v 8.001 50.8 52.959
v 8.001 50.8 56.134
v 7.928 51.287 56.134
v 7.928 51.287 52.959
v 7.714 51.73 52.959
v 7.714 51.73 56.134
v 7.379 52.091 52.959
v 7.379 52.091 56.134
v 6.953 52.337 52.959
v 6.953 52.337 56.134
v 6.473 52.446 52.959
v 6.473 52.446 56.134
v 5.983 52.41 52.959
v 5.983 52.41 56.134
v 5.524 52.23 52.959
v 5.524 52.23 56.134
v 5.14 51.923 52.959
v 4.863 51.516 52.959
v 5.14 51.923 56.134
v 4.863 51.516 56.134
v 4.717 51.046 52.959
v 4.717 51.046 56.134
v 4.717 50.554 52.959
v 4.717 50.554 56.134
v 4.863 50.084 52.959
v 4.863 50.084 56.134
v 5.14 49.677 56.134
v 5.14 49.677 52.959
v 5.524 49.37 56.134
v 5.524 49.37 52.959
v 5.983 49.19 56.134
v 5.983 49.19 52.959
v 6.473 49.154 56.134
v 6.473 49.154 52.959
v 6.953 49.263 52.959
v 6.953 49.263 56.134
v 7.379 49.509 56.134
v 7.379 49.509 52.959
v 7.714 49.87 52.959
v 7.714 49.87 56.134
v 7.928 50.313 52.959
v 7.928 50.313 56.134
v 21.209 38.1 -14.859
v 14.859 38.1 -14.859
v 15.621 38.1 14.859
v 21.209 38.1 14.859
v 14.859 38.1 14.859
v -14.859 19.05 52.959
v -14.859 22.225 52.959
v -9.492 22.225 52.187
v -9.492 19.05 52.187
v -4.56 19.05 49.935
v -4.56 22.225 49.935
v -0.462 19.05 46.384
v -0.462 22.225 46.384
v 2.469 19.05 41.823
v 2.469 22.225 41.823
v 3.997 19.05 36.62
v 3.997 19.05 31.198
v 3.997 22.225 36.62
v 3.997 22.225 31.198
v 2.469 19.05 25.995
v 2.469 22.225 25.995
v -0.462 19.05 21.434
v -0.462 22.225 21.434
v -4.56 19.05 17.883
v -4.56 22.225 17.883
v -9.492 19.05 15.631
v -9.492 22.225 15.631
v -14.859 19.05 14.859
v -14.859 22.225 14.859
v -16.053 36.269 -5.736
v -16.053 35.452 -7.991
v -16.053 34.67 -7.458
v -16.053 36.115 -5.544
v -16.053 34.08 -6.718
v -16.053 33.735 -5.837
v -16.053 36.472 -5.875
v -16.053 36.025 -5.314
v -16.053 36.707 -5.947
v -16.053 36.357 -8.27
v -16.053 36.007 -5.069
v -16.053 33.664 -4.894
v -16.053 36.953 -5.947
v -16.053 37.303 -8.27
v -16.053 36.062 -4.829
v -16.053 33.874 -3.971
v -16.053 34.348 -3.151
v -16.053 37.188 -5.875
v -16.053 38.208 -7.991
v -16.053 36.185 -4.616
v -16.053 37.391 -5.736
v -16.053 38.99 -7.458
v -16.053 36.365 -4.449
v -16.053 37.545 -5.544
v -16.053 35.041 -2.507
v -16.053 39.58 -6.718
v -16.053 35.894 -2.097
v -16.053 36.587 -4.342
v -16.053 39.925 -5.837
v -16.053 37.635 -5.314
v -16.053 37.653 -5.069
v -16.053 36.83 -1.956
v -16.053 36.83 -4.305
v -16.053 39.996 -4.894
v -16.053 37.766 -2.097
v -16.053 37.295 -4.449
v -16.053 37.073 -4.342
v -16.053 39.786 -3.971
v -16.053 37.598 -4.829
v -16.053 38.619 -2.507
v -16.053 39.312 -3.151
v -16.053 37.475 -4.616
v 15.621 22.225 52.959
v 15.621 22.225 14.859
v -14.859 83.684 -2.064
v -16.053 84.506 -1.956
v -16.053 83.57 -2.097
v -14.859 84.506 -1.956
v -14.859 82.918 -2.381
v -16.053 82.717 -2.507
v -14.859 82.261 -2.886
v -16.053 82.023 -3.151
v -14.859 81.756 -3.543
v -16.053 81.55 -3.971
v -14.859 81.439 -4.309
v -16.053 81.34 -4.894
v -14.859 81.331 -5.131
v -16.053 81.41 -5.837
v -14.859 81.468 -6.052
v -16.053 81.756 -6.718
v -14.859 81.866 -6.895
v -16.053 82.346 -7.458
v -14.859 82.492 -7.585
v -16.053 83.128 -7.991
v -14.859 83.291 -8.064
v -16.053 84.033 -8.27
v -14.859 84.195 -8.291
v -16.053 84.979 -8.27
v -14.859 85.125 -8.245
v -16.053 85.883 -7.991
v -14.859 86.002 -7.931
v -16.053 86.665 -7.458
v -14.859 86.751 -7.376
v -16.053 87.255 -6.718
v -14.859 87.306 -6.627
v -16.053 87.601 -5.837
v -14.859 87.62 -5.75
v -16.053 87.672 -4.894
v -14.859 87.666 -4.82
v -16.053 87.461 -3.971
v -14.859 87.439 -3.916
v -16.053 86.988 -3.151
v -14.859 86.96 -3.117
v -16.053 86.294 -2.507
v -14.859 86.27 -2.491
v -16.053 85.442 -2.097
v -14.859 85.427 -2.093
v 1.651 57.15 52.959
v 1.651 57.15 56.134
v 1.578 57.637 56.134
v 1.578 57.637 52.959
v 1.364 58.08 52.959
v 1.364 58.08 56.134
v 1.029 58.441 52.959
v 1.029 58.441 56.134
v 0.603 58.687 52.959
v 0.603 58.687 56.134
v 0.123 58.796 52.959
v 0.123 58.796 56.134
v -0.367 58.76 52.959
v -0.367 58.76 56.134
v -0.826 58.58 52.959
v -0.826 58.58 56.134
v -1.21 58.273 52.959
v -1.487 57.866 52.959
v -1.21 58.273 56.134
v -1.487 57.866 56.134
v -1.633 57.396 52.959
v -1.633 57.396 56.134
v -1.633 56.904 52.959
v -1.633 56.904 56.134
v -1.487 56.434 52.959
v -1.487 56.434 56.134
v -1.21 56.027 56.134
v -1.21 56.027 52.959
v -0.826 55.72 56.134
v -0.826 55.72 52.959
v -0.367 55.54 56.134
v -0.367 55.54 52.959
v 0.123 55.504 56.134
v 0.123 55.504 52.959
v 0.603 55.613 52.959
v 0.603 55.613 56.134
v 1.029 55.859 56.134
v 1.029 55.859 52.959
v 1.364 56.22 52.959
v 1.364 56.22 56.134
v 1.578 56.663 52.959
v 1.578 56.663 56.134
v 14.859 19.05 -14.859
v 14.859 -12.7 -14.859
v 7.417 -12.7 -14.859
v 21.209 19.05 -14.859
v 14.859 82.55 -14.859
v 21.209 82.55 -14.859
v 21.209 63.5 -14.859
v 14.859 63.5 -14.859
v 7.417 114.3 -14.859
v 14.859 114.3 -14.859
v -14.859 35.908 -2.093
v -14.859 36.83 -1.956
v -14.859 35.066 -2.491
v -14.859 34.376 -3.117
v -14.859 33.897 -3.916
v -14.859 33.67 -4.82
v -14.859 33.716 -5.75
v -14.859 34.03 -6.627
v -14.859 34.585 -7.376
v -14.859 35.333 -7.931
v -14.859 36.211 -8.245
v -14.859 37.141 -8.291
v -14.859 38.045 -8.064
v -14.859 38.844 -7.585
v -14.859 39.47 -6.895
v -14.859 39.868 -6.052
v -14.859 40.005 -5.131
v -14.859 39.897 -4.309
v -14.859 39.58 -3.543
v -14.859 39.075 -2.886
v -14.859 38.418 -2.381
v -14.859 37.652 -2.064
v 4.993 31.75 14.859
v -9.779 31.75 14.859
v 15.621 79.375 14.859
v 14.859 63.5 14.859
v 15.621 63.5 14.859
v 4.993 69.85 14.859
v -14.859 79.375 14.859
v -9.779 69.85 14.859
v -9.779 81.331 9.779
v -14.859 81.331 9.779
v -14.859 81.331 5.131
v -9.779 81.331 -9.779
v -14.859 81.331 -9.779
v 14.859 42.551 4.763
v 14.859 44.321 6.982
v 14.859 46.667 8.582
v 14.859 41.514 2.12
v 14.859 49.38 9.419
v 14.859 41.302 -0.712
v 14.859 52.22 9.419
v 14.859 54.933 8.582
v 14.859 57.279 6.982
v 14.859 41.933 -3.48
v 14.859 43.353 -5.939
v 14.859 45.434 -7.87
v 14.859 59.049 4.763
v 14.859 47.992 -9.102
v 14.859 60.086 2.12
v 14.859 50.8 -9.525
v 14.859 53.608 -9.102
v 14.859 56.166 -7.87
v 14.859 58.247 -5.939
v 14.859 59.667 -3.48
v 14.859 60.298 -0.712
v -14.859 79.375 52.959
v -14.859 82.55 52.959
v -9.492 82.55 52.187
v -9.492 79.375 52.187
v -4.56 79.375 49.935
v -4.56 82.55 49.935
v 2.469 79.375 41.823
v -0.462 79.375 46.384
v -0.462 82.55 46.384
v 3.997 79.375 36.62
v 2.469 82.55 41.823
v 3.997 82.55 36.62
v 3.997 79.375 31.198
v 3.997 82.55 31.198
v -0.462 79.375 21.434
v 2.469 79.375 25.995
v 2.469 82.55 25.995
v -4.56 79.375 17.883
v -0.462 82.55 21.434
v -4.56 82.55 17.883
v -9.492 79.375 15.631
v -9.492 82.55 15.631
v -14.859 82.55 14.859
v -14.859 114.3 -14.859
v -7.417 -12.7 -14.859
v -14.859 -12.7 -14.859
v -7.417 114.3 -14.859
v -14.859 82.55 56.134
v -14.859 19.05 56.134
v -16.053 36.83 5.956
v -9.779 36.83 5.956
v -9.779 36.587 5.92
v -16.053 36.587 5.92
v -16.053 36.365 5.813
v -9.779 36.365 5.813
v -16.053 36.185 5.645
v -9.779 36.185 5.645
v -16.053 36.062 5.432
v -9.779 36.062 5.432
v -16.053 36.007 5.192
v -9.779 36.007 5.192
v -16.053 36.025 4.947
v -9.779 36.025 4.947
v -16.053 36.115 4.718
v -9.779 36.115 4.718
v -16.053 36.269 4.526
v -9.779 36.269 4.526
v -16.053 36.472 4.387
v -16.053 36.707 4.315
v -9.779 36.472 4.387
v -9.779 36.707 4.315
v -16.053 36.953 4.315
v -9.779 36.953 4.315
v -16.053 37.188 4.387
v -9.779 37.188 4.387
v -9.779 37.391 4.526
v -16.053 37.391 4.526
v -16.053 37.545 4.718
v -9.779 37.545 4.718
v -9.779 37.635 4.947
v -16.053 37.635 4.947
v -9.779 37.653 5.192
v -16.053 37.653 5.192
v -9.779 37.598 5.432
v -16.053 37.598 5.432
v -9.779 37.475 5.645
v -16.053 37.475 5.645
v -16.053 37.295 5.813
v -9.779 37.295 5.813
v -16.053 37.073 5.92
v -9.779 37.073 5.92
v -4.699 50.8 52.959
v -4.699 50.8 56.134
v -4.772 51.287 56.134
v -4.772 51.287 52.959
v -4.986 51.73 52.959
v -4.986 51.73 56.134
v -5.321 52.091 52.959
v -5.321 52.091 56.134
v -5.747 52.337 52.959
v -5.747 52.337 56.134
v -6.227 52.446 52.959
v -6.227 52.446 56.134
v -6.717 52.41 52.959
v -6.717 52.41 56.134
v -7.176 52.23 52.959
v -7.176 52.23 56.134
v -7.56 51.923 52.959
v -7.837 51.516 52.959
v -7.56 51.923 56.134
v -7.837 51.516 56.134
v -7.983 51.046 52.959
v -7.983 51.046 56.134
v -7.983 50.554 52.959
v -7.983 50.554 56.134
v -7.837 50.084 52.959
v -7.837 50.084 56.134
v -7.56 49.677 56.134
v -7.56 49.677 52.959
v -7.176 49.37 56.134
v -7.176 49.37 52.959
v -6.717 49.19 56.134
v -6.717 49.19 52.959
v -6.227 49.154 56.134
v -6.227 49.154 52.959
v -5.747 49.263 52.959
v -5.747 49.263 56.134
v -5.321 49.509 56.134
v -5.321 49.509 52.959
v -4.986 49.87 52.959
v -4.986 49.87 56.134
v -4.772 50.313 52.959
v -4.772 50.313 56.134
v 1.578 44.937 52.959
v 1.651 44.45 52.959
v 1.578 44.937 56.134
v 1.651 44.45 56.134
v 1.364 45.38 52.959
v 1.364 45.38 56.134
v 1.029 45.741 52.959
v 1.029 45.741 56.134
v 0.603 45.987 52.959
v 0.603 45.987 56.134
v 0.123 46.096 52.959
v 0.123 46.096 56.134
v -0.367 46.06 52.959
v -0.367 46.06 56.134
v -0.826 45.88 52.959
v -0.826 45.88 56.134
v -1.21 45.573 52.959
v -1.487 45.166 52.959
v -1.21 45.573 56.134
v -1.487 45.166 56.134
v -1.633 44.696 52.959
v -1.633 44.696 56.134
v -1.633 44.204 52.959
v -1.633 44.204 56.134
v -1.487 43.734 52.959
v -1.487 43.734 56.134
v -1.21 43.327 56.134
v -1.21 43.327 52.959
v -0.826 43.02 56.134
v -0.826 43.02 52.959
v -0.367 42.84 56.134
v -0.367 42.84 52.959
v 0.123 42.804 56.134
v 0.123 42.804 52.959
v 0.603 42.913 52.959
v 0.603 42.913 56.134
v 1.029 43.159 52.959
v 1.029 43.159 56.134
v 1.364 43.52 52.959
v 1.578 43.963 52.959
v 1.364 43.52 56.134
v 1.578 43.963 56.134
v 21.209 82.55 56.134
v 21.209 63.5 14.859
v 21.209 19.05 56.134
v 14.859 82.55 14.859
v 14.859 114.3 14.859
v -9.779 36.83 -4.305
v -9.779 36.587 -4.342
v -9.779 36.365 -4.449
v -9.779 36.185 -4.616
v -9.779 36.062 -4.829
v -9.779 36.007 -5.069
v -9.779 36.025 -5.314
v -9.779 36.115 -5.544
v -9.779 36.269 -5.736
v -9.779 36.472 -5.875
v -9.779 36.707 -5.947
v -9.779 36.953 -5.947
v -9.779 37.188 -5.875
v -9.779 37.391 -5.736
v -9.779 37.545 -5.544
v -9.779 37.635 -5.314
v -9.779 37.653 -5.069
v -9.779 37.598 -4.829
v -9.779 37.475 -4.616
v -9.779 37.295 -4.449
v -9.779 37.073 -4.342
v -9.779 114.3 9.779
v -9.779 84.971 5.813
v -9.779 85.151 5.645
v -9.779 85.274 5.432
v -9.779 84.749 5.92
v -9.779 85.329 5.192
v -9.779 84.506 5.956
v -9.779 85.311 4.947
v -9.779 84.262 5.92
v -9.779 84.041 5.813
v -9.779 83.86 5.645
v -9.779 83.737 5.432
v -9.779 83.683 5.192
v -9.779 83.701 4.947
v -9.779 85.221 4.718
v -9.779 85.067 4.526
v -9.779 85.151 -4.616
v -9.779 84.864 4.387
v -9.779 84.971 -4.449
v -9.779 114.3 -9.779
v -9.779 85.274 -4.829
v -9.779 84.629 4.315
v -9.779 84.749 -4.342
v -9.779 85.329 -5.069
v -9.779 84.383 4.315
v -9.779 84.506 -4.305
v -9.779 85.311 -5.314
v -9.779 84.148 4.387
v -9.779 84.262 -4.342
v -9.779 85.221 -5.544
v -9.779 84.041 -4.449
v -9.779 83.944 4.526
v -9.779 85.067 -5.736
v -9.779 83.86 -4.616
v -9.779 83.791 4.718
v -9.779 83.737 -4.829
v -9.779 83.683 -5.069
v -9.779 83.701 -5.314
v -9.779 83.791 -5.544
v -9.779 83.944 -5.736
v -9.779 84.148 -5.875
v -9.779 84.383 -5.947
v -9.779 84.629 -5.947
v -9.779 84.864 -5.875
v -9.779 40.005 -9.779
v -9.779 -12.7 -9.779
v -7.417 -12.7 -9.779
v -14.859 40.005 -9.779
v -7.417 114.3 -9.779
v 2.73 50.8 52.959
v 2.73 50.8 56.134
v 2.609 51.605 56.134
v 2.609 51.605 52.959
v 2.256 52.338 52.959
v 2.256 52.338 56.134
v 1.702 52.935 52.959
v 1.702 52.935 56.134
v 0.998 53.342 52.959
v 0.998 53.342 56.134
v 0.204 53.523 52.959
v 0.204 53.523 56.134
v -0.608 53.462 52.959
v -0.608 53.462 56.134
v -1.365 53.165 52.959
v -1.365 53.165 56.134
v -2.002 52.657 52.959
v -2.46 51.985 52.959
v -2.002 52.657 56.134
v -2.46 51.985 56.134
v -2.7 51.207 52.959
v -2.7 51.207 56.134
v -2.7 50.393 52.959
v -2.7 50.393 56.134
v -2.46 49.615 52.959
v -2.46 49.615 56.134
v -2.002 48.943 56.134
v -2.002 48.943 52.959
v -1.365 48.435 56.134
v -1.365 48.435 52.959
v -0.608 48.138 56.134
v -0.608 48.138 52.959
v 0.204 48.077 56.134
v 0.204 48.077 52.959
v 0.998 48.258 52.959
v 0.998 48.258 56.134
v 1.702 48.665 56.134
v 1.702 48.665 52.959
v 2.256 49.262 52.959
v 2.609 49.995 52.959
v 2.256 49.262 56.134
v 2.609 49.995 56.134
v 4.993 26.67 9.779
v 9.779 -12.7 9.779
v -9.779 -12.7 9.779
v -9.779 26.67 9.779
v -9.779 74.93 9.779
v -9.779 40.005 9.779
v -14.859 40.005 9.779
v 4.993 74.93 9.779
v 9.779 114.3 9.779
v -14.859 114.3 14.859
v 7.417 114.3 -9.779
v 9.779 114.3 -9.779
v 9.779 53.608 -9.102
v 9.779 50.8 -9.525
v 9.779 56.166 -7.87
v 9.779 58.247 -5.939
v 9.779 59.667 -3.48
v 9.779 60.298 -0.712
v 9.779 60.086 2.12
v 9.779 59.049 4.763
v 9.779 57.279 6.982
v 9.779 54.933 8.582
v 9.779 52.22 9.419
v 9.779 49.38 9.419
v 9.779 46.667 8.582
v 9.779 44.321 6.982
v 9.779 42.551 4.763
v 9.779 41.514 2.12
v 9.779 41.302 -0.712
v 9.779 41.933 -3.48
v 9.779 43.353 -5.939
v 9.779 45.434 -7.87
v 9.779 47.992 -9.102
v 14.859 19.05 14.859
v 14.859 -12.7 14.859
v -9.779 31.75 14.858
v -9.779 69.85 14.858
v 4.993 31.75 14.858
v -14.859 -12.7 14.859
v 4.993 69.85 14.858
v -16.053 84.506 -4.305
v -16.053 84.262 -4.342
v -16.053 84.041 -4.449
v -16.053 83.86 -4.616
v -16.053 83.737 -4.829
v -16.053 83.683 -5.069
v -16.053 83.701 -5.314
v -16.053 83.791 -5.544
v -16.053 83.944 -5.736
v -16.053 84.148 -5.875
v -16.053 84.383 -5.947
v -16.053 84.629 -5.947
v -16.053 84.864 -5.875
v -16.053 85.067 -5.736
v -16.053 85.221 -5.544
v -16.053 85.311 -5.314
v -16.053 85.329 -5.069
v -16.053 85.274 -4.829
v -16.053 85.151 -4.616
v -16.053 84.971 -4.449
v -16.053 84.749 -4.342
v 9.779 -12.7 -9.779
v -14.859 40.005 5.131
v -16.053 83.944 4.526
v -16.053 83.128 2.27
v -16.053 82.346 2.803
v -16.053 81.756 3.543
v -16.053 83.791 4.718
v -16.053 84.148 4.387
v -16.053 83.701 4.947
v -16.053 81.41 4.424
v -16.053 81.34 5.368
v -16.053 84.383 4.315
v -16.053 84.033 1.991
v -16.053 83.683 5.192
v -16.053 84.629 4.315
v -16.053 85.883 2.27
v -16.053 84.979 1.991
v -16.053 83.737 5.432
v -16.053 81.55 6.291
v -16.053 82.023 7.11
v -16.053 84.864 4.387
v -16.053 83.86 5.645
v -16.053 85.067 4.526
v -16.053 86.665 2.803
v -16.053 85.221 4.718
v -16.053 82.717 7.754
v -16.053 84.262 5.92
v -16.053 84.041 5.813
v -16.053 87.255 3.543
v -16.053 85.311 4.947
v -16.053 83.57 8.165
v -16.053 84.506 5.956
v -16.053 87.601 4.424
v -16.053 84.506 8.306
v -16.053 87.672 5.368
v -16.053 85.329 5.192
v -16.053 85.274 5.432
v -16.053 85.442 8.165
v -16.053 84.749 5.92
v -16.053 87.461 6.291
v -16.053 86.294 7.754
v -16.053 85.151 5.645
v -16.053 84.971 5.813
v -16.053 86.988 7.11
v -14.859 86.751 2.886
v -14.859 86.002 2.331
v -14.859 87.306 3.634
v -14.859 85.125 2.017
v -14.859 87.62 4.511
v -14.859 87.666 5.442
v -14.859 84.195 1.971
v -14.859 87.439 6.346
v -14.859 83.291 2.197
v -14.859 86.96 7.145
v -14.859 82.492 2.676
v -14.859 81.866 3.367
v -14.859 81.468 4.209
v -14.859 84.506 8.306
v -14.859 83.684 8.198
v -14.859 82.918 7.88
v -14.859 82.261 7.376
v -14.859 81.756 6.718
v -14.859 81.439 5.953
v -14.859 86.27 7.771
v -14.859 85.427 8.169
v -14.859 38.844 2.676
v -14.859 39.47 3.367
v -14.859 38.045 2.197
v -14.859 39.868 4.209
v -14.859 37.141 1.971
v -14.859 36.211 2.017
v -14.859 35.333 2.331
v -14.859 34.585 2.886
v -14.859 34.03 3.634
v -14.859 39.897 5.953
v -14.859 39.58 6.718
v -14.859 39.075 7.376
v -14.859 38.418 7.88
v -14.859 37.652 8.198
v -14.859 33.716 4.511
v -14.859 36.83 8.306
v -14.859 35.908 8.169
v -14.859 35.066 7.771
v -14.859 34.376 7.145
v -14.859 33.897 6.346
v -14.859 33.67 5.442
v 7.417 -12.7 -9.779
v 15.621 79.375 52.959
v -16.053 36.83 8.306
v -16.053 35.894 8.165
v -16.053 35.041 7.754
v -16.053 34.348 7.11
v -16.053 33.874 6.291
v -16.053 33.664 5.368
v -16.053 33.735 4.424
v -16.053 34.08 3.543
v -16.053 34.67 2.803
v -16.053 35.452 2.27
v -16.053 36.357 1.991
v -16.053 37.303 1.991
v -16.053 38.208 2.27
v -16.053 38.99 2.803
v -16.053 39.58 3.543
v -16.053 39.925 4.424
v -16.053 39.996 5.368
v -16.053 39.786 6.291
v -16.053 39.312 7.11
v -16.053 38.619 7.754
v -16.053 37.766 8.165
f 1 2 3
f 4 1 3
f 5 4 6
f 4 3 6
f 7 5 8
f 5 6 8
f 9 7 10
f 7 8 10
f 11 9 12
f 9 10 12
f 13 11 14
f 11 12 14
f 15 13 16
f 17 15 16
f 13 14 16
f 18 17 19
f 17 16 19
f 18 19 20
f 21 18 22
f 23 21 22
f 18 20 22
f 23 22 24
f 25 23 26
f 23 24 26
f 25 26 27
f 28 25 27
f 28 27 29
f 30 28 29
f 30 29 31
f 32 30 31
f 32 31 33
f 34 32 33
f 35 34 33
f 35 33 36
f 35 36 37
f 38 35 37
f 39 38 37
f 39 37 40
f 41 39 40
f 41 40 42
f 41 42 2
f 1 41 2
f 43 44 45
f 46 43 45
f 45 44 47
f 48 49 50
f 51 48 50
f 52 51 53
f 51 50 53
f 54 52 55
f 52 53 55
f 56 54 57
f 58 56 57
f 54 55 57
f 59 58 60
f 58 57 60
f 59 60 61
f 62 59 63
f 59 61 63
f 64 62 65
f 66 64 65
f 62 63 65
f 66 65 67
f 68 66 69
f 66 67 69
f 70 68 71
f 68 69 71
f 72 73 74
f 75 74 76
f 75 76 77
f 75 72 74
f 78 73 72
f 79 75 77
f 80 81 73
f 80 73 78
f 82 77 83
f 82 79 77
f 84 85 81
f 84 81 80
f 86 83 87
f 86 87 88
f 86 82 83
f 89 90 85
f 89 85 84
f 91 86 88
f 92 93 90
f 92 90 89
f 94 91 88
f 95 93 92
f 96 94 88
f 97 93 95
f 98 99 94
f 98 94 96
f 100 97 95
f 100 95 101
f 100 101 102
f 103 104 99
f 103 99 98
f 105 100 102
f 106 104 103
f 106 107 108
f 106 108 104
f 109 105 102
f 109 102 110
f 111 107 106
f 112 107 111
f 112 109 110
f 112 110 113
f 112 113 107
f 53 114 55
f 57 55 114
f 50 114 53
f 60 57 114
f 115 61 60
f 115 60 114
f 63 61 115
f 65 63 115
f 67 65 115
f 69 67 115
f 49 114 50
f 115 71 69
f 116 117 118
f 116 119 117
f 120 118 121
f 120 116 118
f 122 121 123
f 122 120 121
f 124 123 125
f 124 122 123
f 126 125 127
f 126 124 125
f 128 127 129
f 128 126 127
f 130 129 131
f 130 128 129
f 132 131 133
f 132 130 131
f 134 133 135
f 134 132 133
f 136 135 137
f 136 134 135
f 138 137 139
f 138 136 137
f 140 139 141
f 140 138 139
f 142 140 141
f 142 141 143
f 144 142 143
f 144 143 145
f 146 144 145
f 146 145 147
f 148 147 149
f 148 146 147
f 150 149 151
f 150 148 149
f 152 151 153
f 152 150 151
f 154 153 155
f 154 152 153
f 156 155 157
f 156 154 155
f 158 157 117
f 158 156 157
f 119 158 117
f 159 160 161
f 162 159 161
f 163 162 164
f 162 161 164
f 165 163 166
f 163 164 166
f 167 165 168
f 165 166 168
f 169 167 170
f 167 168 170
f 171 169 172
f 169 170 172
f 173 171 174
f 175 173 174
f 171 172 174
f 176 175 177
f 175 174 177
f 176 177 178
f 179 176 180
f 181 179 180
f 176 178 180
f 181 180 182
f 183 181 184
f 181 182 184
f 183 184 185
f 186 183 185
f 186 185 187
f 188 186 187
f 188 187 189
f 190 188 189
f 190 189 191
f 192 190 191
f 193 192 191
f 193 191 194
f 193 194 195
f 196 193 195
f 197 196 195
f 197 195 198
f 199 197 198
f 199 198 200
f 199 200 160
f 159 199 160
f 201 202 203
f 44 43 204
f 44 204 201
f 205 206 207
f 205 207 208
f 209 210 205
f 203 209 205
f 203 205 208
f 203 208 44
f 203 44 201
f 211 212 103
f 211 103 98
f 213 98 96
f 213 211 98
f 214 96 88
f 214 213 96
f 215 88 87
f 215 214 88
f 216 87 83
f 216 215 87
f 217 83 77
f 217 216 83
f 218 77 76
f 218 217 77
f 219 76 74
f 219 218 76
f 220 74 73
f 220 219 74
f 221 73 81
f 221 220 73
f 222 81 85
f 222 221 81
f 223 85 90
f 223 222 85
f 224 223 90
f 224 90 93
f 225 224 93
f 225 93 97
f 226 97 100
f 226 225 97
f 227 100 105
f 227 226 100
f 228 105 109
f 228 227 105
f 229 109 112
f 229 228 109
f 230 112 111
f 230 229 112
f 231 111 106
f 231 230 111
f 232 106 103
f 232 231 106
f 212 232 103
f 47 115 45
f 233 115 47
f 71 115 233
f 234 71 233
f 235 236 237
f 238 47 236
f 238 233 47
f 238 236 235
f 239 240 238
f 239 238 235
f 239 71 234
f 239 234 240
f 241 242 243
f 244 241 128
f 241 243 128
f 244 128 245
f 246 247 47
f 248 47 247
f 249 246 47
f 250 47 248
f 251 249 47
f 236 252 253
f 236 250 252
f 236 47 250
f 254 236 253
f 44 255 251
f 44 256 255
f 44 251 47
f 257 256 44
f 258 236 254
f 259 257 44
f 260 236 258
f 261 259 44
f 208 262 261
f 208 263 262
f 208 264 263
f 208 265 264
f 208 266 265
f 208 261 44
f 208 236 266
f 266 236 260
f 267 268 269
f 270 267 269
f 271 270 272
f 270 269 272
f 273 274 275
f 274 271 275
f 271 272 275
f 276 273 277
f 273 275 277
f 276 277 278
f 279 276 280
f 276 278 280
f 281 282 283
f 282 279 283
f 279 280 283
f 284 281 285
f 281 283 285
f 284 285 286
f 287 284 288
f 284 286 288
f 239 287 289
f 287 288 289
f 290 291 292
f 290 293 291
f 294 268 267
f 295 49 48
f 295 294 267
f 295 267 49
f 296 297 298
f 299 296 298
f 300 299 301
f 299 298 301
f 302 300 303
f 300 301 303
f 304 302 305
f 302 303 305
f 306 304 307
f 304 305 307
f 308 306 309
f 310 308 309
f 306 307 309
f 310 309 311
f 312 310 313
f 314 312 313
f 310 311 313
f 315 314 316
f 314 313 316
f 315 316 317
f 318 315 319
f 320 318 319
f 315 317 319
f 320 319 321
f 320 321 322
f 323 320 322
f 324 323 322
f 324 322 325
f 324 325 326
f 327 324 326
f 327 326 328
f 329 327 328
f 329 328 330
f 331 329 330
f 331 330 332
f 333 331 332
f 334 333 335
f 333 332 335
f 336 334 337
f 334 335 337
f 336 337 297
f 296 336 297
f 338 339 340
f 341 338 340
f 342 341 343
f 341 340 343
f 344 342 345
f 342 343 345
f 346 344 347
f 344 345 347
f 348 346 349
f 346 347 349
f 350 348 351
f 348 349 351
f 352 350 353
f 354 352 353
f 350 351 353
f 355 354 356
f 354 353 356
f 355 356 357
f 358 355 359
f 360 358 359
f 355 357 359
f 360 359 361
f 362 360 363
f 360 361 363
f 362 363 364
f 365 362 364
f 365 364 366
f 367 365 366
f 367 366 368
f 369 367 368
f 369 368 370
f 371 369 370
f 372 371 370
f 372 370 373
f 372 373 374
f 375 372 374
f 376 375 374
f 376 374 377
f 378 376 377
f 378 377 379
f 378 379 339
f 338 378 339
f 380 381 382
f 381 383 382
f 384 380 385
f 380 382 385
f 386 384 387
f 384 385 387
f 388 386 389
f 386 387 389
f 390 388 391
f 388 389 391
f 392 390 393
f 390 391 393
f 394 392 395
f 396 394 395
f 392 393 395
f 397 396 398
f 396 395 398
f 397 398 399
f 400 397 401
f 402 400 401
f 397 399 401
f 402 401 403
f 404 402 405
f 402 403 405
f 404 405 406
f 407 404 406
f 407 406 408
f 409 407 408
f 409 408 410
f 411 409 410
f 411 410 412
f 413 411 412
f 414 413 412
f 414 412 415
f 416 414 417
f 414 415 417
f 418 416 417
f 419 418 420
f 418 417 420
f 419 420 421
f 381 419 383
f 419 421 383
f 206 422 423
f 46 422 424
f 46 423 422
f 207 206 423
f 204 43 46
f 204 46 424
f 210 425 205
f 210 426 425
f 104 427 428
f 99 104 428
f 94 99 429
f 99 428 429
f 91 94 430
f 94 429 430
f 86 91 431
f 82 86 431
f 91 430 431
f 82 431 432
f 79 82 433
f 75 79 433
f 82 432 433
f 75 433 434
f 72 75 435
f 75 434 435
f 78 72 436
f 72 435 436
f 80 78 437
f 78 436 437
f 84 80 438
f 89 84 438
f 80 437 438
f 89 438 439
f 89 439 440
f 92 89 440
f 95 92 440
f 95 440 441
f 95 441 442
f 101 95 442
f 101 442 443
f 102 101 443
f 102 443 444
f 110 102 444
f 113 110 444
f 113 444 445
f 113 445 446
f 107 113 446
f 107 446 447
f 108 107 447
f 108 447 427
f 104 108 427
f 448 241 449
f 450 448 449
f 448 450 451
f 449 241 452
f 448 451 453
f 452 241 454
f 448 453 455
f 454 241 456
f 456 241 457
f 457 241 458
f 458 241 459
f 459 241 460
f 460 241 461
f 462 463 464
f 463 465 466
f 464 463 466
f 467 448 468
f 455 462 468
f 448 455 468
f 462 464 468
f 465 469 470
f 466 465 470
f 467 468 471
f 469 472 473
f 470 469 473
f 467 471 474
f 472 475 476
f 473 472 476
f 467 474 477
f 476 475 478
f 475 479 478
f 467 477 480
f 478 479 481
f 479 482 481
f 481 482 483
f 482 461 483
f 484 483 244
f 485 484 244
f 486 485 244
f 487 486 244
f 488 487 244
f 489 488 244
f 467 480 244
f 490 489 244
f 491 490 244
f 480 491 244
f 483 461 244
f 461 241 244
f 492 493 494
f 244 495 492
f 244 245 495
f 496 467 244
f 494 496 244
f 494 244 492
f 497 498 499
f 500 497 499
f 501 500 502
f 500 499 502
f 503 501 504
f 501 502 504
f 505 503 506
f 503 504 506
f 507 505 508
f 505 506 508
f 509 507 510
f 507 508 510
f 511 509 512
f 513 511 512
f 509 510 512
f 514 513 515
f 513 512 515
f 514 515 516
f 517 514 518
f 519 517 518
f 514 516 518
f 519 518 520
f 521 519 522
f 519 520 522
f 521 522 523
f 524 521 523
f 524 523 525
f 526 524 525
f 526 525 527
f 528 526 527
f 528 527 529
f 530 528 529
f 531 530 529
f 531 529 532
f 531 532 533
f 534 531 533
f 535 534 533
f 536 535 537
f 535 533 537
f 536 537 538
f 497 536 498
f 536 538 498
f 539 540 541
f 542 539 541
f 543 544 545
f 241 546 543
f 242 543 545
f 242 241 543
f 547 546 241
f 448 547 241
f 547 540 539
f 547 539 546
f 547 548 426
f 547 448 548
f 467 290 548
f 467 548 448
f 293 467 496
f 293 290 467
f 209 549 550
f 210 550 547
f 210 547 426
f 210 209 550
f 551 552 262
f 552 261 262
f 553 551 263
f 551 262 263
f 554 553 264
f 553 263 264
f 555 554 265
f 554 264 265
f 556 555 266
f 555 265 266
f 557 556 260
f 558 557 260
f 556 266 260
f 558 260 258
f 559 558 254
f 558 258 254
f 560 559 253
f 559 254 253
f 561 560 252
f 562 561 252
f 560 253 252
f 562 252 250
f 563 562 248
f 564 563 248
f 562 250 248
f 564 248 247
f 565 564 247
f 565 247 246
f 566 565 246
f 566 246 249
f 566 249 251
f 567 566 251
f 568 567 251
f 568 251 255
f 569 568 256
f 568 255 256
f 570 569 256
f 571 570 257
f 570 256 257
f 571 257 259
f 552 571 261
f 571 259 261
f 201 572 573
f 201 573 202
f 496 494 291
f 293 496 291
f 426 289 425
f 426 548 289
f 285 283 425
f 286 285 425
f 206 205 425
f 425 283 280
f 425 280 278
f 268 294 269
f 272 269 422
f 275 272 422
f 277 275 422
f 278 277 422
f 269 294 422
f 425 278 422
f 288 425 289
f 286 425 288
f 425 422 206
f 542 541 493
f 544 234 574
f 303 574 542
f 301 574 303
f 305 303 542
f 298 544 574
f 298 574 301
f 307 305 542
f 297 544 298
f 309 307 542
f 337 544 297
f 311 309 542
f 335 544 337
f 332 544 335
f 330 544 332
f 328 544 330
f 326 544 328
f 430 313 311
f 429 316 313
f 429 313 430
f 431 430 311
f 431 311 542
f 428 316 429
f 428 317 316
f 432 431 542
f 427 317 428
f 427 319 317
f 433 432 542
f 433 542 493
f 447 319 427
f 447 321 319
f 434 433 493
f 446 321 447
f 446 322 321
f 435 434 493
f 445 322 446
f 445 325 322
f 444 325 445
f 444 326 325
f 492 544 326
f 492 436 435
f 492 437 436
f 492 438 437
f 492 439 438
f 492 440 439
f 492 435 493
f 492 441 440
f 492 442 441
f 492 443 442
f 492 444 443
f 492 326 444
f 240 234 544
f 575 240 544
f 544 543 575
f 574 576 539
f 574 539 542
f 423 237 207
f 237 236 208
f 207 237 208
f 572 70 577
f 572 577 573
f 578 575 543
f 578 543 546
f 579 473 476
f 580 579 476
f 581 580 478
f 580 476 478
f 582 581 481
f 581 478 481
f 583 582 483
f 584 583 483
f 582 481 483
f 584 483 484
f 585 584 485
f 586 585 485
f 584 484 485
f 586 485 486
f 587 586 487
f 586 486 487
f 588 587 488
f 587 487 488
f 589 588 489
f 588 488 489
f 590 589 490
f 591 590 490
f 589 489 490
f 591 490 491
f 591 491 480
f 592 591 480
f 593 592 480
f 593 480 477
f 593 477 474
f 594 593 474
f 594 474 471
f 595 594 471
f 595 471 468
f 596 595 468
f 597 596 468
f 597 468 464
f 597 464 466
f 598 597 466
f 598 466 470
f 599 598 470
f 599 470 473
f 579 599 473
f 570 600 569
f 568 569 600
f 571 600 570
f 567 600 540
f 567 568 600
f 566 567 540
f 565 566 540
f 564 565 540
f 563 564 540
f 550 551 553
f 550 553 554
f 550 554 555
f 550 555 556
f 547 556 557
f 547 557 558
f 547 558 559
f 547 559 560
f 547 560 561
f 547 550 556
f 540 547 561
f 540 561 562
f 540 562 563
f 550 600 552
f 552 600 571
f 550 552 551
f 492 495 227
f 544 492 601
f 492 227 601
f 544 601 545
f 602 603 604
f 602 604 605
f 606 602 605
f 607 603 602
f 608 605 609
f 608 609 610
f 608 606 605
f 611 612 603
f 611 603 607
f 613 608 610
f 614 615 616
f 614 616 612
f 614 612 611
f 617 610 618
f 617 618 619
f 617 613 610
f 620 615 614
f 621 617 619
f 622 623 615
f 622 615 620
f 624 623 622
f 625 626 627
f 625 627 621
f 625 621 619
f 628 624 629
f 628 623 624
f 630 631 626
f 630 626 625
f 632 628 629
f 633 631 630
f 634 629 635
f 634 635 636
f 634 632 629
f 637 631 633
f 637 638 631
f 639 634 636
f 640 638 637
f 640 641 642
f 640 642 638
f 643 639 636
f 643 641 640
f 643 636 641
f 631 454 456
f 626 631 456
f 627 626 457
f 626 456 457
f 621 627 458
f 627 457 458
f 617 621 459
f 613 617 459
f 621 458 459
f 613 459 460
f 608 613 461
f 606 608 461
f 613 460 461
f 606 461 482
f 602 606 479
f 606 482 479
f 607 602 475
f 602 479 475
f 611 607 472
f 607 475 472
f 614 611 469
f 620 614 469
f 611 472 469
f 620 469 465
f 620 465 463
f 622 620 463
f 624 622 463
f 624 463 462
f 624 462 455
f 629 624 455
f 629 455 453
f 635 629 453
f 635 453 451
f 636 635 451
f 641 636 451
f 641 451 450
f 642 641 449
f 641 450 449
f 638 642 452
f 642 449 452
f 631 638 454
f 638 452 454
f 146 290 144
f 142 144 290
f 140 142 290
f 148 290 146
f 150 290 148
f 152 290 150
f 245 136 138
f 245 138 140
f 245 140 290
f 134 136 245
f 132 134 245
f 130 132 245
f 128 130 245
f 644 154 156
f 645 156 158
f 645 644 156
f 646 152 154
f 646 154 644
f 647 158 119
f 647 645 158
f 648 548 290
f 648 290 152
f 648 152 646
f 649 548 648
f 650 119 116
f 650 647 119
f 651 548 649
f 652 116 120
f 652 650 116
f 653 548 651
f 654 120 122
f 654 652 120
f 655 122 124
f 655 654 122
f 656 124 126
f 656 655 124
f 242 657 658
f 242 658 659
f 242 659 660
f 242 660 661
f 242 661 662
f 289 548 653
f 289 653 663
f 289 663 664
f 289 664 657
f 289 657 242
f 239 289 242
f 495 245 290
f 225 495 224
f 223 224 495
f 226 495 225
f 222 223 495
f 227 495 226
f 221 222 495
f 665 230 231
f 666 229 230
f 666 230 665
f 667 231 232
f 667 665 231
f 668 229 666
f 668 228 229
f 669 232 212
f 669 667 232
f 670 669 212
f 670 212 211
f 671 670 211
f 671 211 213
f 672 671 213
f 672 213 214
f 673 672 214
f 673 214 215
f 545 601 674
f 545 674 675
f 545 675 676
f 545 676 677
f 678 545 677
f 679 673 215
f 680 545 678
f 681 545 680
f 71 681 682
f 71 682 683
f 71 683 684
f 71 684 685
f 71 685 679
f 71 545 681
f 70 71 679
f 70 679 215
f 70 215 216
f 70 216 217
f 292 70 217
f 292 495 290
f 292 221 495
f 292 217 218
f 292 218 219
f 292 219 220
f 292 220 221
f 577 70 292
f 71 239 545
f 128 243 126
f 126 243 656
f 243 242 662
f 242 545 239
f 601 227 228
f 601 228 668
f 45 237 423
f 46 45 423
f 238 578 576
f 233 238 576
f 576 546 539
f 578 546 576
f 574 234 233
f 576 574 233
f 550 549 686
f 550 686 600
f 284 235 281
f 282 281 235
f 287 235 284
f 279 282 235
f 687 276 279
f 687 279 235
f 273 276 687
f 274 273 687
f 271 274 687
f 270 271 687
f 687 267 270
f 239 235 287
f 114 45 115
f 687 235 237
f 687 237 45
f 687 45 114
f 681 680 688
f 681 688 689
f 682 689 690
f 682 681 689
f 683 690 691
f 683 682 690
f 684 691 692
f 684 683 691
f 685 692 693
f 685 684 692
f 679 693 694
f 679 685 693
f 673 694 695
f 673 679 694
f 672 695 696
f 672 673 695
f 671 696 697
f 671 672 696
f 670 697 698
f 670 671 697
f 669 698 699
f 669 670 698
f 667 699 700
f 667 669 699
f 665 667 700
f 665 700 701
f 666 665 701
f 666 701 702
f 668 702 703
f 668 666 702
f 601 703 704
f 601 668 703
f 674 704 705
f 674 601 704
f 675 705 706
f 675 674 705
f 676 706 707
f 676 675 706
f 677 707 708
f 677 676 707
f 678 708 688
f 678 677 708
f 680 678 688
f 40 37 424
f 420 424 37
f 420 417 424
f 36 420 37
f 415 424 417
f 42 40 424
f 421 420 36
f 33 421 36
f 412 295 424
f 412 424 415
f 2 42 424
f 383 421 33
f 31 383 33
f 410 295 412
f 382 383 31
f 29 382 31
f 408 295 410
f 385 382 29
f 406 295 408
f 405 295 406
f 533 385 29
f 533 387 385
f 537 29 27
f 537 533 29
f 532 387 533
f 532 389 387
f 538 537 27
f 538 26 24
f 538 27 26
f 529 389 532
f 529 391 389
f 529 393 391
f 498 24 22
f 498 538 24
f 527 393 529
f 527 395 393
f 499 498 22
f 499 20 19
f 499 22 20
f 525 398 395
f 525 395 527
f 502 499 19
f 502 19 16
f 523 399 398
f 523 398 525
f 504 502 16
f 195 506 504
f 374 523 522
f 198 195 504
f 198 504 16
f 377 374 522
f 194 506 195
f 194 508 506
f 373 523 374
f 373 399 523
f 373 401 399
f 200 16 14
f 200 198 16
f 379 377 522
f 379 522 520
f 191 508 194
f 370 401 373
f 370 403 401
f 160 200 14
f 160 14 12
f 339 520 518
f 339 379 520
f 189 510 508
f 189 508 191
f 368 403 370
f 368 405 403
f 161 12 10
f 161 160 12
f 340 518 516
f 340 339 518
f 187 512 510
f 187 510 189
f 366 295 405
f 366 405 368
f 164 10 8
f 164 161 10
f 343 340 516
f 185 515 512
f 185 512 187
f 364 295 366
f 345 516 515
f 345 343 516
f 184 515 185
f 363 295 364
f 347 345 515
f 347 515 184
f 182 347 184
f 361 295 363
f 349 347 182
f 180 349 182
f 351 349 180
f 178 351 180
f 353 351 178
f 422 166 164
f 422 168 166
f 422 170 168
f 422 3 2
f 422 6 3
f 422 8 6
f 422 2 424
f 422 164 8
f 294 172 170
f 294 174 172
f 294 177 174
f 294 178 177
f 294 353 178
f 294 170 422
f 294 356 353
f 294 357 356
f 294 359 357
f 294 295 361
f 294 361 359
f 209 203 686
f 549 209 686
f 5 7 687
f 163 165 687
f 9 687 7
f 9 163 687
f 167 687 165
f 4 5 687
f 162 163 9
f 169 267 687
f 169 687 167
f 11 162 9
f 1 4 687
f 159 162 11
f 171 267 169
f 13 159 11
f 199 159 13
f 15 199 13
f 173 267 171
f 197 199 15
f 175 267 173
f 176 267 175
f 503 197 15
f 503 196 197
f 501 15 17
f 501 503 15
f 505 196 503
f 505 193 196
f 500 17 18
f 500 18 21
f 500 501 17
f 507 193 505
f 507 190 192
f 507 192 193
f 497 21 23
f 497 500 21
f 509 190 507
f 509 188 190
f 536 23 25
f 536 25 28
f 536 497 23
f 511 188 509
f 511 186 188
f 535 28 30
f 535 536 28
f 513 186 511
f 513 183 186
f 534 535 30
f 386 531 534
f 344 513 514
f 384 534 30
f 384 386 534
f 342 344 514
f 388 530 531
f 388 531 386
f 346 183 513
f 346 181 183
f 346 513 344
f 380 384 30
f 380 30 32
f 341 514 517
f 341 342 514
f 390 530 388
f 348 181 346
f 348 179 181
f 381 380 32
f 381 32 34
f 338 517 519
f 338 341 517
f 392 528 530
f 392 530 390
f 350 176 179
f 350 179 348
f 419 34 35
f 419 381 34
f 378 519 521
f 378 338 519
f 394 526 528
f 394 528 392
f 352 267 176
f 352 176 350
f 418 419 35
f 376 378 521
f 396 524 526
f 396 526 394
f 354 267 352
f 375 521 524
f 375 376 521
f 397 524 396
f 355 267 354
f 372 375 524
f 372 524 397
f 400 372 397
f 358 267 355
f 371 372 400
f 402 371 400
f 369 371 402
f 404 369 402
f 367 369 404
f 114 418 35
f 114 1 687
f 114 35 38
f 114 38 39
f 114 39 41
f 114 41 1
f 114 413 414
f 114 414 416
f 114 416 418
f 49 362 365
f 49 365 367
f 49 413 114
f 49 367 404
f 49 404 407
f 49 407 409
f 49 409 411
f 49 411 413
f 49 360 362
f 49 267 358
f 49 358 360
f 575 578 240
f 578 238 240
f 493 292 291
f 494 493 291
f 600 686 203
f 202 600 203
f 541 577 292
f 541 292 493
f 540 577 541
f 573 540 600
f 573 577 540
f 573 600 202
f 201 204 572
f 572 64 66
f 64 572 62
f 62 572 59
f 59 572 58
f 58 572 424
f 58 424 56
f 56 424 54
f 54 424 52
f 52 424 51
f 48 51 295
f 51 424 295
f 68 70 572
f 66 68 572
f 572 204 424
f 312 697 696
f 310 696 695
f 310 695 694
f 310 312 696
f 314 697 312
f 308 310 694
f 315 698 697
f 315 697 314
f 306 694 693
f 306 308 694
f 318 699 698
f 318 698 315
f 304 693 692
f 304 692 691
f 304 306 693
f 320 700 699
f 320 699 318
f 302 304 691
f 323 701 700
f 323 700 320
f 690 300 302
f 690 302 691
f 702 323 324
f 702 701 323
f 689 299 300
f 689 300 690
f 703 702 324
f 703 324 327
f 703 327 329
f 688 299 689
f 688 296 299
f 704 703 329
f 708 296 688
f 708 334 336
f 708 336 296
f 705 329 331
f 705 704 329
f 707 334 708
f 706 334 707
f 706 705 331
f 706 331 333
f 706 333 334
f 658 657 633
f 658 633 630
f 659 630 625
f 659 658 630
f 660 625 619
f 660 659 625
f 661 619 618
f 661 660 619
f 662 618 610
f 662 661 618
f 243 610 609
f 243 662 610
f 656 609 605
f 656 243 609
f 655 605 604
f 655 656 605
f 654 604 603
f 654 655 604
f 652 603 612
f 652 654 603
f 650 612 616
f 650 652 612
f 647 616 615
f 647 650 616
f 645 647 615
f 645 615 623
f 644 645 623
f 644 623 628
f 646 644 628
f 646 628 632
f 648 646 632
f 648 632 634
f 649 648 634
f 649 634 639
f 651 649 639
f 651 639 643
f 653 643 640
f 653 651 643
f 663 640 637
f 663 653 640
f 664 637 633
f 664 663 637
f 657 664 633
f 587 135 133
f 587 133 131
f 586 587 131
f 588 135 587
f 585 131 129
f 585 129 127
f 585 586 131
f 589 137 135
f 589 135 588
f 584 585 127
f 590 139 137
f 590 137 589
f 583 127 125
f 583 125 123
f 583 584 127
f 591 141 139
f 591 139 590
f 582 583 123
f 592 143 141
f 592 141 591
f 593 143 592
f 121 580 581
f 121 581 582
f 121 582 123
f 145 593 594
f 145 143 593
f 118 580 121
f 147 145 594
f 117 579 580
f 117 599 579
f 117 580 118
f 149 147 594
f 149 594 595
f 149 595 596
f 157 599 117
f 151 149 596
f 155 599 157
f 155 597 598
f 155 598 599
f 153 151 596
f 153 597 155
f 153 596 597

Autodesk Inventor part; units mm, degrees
ref_plane "YZ Plane" through (0, 0, 0) normal (1, 0, 0) x (0, 1, 0)
ref_plane "XZ Plane" through (0, 0, 0) normal (0, 1, 0) x (-1, 0, 0)
ref_plane "XY Plane" through (0, 0, 0) normal (0, 0, 1) x (1, 0, 0)
sketch "Sketch1" plane through (0, 0, 0) normal (0, 1, 0) x (-1, 0, 0)
  line L0 (12.7, 12.7) -> (-12.7, 12.7)
  line L1 (-12.7, 12.7) -> (-12.7, -12.7)
  line L2 (-12.7, -12.7) -> (12.7, -12.7)
  line L3 (12.7, -12.7) -> (12.7, 12.7)
  point P0 (0, 0)
  dimension "d0" = 12.7
  dimension "d1" = 12.7
  dimension "d2" = 25.4
  dimension "d3" = 25.4
extrude "Extrusion1" add sketch "Sketch1" along normal blind 101.6
sketch "Sketch2" plane through (0, 101.6, 0) normal (0, 1, 0) x (1, 0, 0)
  line L0 (-9.779, -9.779) -> (9.779, -9.779)
  line L1 (9.779, -9.779) -> (9.779, 9.779)
  line L2 (9.779, 9.779) -> (-9.779, 9.779)
  line L3 (-9.779, 9.779) -> (-9.779, -9.779)
  line L4 (-12.7, 12.7) -> (-12.7, -12.7) projected
  line L5 (-12.7, -12.7) -> (12.7, -12.7) projected
  line L6 (12.7, -12.7) -> (12.7, 12.7) projected
  line L7 (12.7, 12.7) -> (-12.7, 12.7) projected
  point P0 (0, 0)
  dimension "d6" = 2.921
  dimension "d7" = 2.921
  dimension "d8" = 2.921
  dimension "d9" = 2.921
extrude "Extrusion2" cut sketch "Sketch2" against normal blind 101.6 contours L3 L2 L1 L0
sketch "Sketch3" plane through (0, 101.6, 0) normal (0, 1, 0) x (1, 0, 0)
  line L0 (-9.779, 9.779) -> (9.779, 9.779) projected
  line L1 (12.7, 12.7) -> (-12.7, 12.7) projected
  line L2 (-7.4168, 9.779) -> (7.4168, 9.779)
  line L3 (7.4168, 9.779) -> (7.4168, 12.7)
  line L4 (7.4168, 12.7) -> (-7.4168, 12.7)
  line L5 (-7.4168, 12.7) -> (-7.4168, 9.779)
  line L6 (-12.7, 12.7) -> (-12.7, -12.7) projected
  line L7 (12.7, -12.7) -> (12.7, 12.7) projected
  point P0 (0, 0)
  dimension "d12" = 5.2832
  dimension "d13" = 5.2832
extrude "Extrusion3" cut sketch "Sketch3" against normal blind 101.6
sketch "Sketch5" plane through (-12.7, 0, -12.7) normal (-1, 0, 0) x (0, 0, 1)
  line L0 (2.921, 40.005) -> (22.479, 40.005)
  line L1 (22.479, 40.005) -> (22.479, 81.3308)
  line L2 (22.479, 81.3308) -> (2.921, 81.3308)
  line L3 (2.921, 81.3308) -> (2.921, 40.005)
  line L4 (0, 0) -> (0, 101.6) projected
  line L5 (22.479, 101.6) -> (2.921, 101.6) projected
  point P0 (12.7, 0)
  dimension "d16" = 19.558
  dimension "d17" = 2.921
  dimension "d18" = 20.2692
  dimension "d19" = 41.3258
extrude "Extrusion4" cut sketch "Sketch5" against normal blind 5.08
sketch "Sketch6" plane through (-12.7, 0, -12.7) normal (-1, 0, 0) x (0, 0, 1)
  circle A0 centre (17.8308, 36.83) radius 3.175
  line L0 (25.4, 0) -> (25.4, 101.6) projected
  circle A1 centre (7.5692, 36.83) radius 3.175
  circle A2 centre (17.8308, 84.5058) radius 3.175
  circle A3 centre (7.5692, 84.5058) radius 3.175
  line L1 (0, 101.6) -> (25.4, 101.6) projected
  point P0 (12.7, 0)
  dimension "d22" = 7.5692
  dimension "d23" = 10.2616
  dimension "d24" = 6.35
  dimension "d25" = 6.35
  dimension "d26" = 6.35
  dimension "d27" = 6.35
  dimension "d28" = 17.0942
  dimension "d29" = 17.0942
  dimension "d30" = 10.2616
  dimension "d31" = 7.5692
  dimension "d32" = 47.6758
  dimension "d33" = 47.6758
extrude "Extrusion5" add sketch "Sketch6" along normal blind 3.3528
hole "Hole1" at (-16.0528, 84.5058, 5.1308) direction (1, 0, 0) diameter 1.651 depth 12.7 tip angle 118
hole "Hole2" at (-16.0528, 84.5058, -5.1308) direction (1, 0, 0) diameter 1.651 depth 12.7 tip angle 118
hole "Hole3" at (-16.0528, 36.83, 5.1308) direction (1, 0, 0) diameter 1.651 depth 12.7 tip angle 118
hole "Hole4" at (-16.0528, 36.83, -5.1308) direction (1, 0, 0) diameter 1.651 depth 12.7 tip angle 118
sketch "Sketch11" plane through (-12.7, 0, 12.7) normal (0, 0, 1) x (1, 0, 0)
  line L0 (5.08, 31.75) -> (17.78, 31.75)
  line L1 (17.78, 31.75) -> (17.78, 69.85)
  line L2 (17.78, 69.85) -> (5.08, 69.85)
  line L3 (5.08, 69.85) -> (5.08, 31.75)
  line L4 (0, 0) -> (25.4, 0) projected
  line L5 (0, 101.6) -> (25.4, 101.6) projected
  line L6 (0, 0) -> (0, 101.6) projected
  point P0 (12.7, 0)
  dimension "d82" = 31.75
  dimension "d83" = 31.75
  dimension "d84" = 5.08
  dimension "d85" = 12.7
extrude "Extrusion6" cut sketch "Sketch11" against normal blind 10.16
sketch "Sketch12" plane through (0, 0, 0) normal (0, -1, 0) x (1, 0, 0)
  line L0 (-7.4168, -9.779) -> (-7.4168, -14.859)
  line L1 (-7.4168, -14.859) -> (-14.859, -14.859)
  line L2 (-14.859, -14.859) -> (-14.859, 14.859)
  line L3 (-12.7, -12.7) -> (-12.7, 12.7) projected
  line L4 (-7.4168, -12.7) -> (-12.7, -12.7) projected
  line L5 (7.4168, -9.779) -> (7.4168, -14.859)
  line L6 (7.4168, -9.779) -> (7.4168, -12.7) projected
  line L7 (7.4168, -14.859) -> (14.859, -14.859)
  line L8 (14.859, -14.859) -> (14.859, 14.859)
  line L9 (12.7, -12.7) -> (7.4168, -12.7) projected
  line L10 (12.7, 12.7) -> (12.7, -12.7) projected
  line L11 (14.859, 14.859) -> (-14.859, 14.859)
  line L12 (5.08, 12.7) -> (-7.62, 12.7) projected
  line L13 (-7.4168, -12.7) -> (-7.4168, -9.779)
  line L14 (-7.4168, -12.7) -> (-7.4168, -9.779) projected
  line L15 (-9.779, -9.779) -> (-9.779, 9.779)
  line L16 (-9.779, 9.779) -> (9.779, 9.779) projected
  line L17 (-9.779, 9.779) -> (9.779, 9.779)
  line L18 (9.779, 9.779) -> (-9.779, 9.779) projected
  line L19 (9.779, 9.779) -> (9.779, -9.779)
  line L20 (9.779, -9.779) -> (7.4168, -9.779)
  line L21 (7.4168, -9.779) -> (9.779, -9.779) projected
  line L22 (-7.4168, -9.779) -> (-9.779, -9.779)
  point P0 (0, 0)
  dimension "d88" = 5.08
  dimension "d89" = 2.159
  dimension "d90" = 2.159
  dimension "d92" = 2.159
  dimension "d94" = 2.159
  dimension "d95" = 2.159
extrude "Extrusion7" add sketch "Sketch12" against normal blind 101.6
hole "Hole5" at (-16.0528, 84.5058, 5.1308) direction (1, 0, 0) diameter 1.651 depth 12.7 tip angle 118
hole "Hole6" at (-16.0528, 84.5058, -5.1308) direction (1, 0, 0) diameter 1.651 depth 12.7 tip angle 118
hole "Hole7" at (-16.0528, 36.83, 5.1308) direction (1, 0, 0) diameter 1.651 depth 12.7 tip angle 118
hole "Hole8" at (-16.0528, 36.83, -5.1308) direction (1, 0, 0) diameter 1.651 depth 12.7 tip angle 118
sketch "Sketch13" plane through (-14.859, 0, -14.859) normal (-1, 0, 0) x (0, 0, 1)
  line L0 (5.08, 40.005) -> (24.638, 40.005)
  line L1 (24.638, 40.005) -> (24.638, 81.3308)
  line L2 (24.638, 81.3308) -> (5.08, 81.3308)
  line L3 (5.08, 81.3308) -> (5.08, 40.005)
  line L4 (0, 0) -> (0, 101.6) projected
  line L5 (29.718, 0) -> (29.718, 101.6) projected
  line L6 (0, 101.6) -> (29.718, 101.6) projected
  point P0 (14.859, 0)
  dimension "d136" = 41.3258
  dimension "d137" = 20.2692
  dimension "d139" = 19.558
  dimension "d140" = 29.718
  dimension "d141" = 5.08
  dimension "d142" = 5.08
extrude "Extrusion8" cut sketch "Sketch13" against normal blind 10.16
sketch "Sketch15" plane through (-14.859, 0, 14.859) normal (0, 0, 1) x (1, 0, 0)
  line L0 (5.08, 31.75) -> (24.13, 31.75)
  line L1 (24.13, 31.75) -> (24.13, 69.85)
  line L2 (24.13, 69.85) -> (5.08, 69.85)
  line L3 (5.08, 69.85) -> (5.08, 31.75)
  line L4 (0, 101.6) -> (29.718, 101.6) projected
  line L5 (0, 0) -> (0, 101.6) projected
  line L6 (29.718, 0) -> (29.718, 101.6) projected
  point P0 (14.859, 0)
  dimension "d145" = 38.1
  dimension "d146" = 31.75
  dimension "d147" = 19.05
  dimension "d148" = 5.08
extrude "Extrusion9" cut sketch "Sketch15" against normal blind 10.16
chamfer "Chamfer1" distance 5.08 angle 45 2 edges at (-0.254, 69.85, 9.779) (-0.254, 31.75, 9.779)
sketch "Sketch17" plane through (0, 101.6, 0) normal (0, 1, 0) x (1, 0, 0)
  line L0 (-7.4168, 9.779) -> (-7.4168, 14.859)
  line L1 (-7.4168, 14.859) -> (-14.859, 14.859)
  line L2 (-14.859, 14.859) -> (-14.859, -14.859)
  line L3 (-14.859, -14.859) -> (14.859, -14.859)
  line L4 (14.859, -14.859) -> (14.859, 14.859)
  line L5 (14.859, 14.859) -> (14.859, -14.859) projected
  line L6 (14.859, 14.859) -> (7.4168, 14.859)
  line L7 (7.4168, 14.859) -> (7.4168, 9.779)
  line L8 (7.4168, 9.779) -> (7.4168, 14.859) projected
  line L9 (7.4168, 9.779) -> (9.779, 9.779)
  line L10 (9.779, 9.779) -> (9.779, -9.779)
  line L11 (9.779, -9.779) -> (-9.779, -9.779)
  line L12 (-9.779, -9.779) -> (9.779, -9.779) projected
  line L13 (-9.779, -9.779) -> (-9.779, 9.779)
  line L14 (-9.779, -9.779) -> (-9.779, 9.779) projected
  line L15 (-9.779, 9.779) -> (-7.4168, 9.779)
  line L16 (-7.4168, 9.779) -> (-9.779, 9.779) projected
  line L17 (-7.4168, 9.779) -> (-7.4168, 14.859)
  point P0 (0, 0)
extrude "Extrusion10" add sketch "Sketch17" along normal blind 12.7
sketch "Sketch18" plane through (0, 0, 0) normal (0, -1, 0) x (1, 0, 0)
  line L0 (-7.4168, -9.779) -> (-7.4168, -14.859)
  line L1 (-7.4168, -14.859) -> (-7.4168, -9.779) projected
  line L2 (-7.4168, -14.859) -> (-14.859, -14.859)
  line L3 (-14.859, -14.859) -> (-7.4168, -14.859) projected
  line L4 (-14.859, -14.859) -> (-14.859, 14.859)
  line L5 (-14.859, 14.859) -> (14.859, 14.859)
  line L6 (14.859, 14.859) -> (-14.859, 14.859) projected
  line L7 (14.859, 14.859) -> (14.859, -14.859)
  line L8 (14.859, -14.859) -> (7.4168, -14.859)
  line L9 (7.4168, -14.859) -> (7.4168, -9.779)
  line L10 (7.4168, -9.779) -> (7.4168, -14.859) projected
  line L11 (7.4168, -9.779) -> (9.779, -9.779)
  line L12 (9.779, -9.779) -> (9.779, 9.779)
  line L13 (9.779, 9.779) -> (9.779, -9.779) projected
  line L14 (9.779, 9.779) -> (-9.779, 9.779)
  line L15 (-9.779, 9.779) -> (-9.779, -9.779)
  line L16 (-9.779, -9.779) -> (-9.779, 9.779) projected
  line L17 (-9.779, -9.779) -> (-7.4168, -9.779)
  line L18 (-7.4168, -9.779) -> (-9.779, -9.779) projected
  line L19 (-7.4168, -14.859) -> (-14.859, -14.859)
  point P0 (0, 0)
extrude "Extrusion11" add sketch "Sketch18" along normal blind 12.7
sketch "Sketch20" plane through (14.859, 114.3, 14.859) normal (1, 0, 0) x (0, 0, -1)
  circle A0 centre (14.859, -63.5) radius 9.525
  line L0 (29.718, -127) -> (0, -127) projected
  line L1 (0, 0) -> (0, -127) projected
  line L2 (29.718, 0) -> (29.718, -127) projected
  point P0 (14.859, -114.3)
  dimension "d160" = 63.5
  dimension "d161" = 19.05
  dimension "d162" = 14.859
  dimension "d163" = 29.718
extrude "Extrusion12" cut sketch "Sketch20" against normal blind 12.7
sketch "Sketch21" plane through (14.859, 114.3, 14.859) normal (1, 0, 0) x (0, 0, -1)
  line L0 (0, 0) -> (0, -127) projected
  line L1 (29.718, 0) -> (29.718, -127) projected
  line L2 (0, -95.25) -> (29.718, -95.25)
  line L3 (29.718, -95.25) -> (29.718, -76.2)
  line L4 (29.718, -76.2) -> (0, -76.2)
  line L5 (0, -76.2) -> (0, -95.25)
  circle A0 centre (14.859, -63.5) radius 9.525 projected
  line L6 (0, -50.8) -> (29.718, -50.8)
  line L7 (29.718, -50.8) -> (29.718, -31.75)
  line L8 (29.718, -31.75) -> (0, -31.75)
  line L9 (0, -31.75) -> (0, -50.8)
  point P0 (14.859, -114.3)
  dimension "d166" = 12.7
  dimension "d167" = 19.05
  dimension "d168" = 12.7
  dimension "d169" = 19.05
extrude "Extrusion13" add sketch "Sketch21" along normal blind 6.35 contours L8 L1 L6 L0 | L4 L1 L2 L0
sketch "Sketch22" plane through (-14.859, 114.3, 14.859) normal (0, 0, 1) x (1, 0, 0)
  line L0 (36.068, -95.25) -> (29.718, -95.25)
  line L1 (29.718, -95.25) -> (29.718, -31.75)
  line L2 (29.718, -31.75) -> (36.068, -31.75)
  line L3 (36.068, -31.75) -> (36.068, -95.25)
  point P0 (14.859, -114.3)
extrude "Extrusion14" add sketch "Sketch22" along normal blind 63.5
sketch "Sketch23" plane through (-14.859, 114.3, 78.359) normal (0, 0, 1) x (1, 0, 0)
  line L0 (29.718, -95.25) -> (29.718, -127) projected
  line L1 (0, 0) -> (0, -127) projected
  line L2 (0, 0) -> (29.718, 0) projected
  line L3 (29.718, -127) -> (0, -127) projected
  circle A0 centre (14.859, -63.5) radius 2.7305
  circle A1 centre (14.859, -57.15) radius 1.651
  circle A2 centre (8.509, -63.5) radius 1.651
  circle A3 centre (14.859, -69.85) radius 1.651
  circle A4 centre (21.209, -63.5) radius 1.651
  line L4 (36.068, -95.25) -> (0, -95.25)
  line L5 (0, -95.25) -> (0, -31.75)
  line L6 (0, -31.75) -> (36.068, -31.75)
  line L7 (36.068, -31.75) -> (36.068, -95.25)
  point P0 (14.859, -114.3)
  dimension "d174" = 29.718
  dimension "d175" = 127
  dimension "d176" = 63.5
  dimension "d177" = 14.859
  dimension "d178" = 5.461
  dimension "d179" = 6.35
  dimension "d180" = 3.302
  dimension "d181" = 0
  dimension "d182" = 6.35
  dimension "d183" = 3.302
  dimension "d184" = 6.35
  dimension "d185" = 0
  dimension "d186" = 3.302
  dimension "d187" = 6.35
  dimension "d188" = 0
  dimension "d189" = 3.302
  dimension "d190" = 63.5
  dimension "d191" = 0
extrude "Extrusion15" add sketch "Sketch23" against normal blind 63.5 contours L4 L1 L6 L7
sketch "Sketch24" plane through (-14.859, 114.3, -14.859) normal (-1, 0, 0) x (0, 0, 1)
  line L0 (29.718, -34.925) -> (67.818, -34.925)
  line L1 (67.818, -34.925) -> (67.818, -92.075)
  line L2 (67.818, -92.075) -> (29.718, -92.075)
  line L3 (29.718, -92.075) -> (29.718, -34.925)
  line L4 (29.718, -95.25) -> (29.718, -127) projected
  line L5 (93.218, -95.25) -> (29.718, -95.25) projected
  line L6 (93.218, -31.75) -> (29.718, -31.75) projected
  point P0 (14.859, -114.3)
  dimension "d194" = 38.1
  dimension "d195" = 0
  dimension "d196" = 3.175
  dimension "d197" = 3.175
extrude "Extrusion16" cut sketch "Sketch24" against normal blind 30.48
sketch "Sketch26" plane through (-14.859, 114.3, -14.859) normal (-1, 0, 0) x (0, 0, 1)
  line L0 (93.218, -95.25) -> (29.718, -95.25) projected
  line L1 (70.993, -95.25) -> (70.993, -31.75)
  line L2 (93.218, -31.75) -> (29.718, -31.75) projected
  line L3 (67.818, -34.925) -> (67.818, -92.075) projected
  line L4 (70.993, -95.25) -> (93.218, -95.25)
  line L5 (93.218, -31.75) -> (70.993, -31.75)
  line L6 (93.218, -95.25) -> (70.993, -95.25)
  line L7 (70.993, -95.25) -> (70.993, -31.75)
  line L8 (70.993, -31.75) -> (93.218, -31.75)
  line L9 (93.218, -31.75) -> (93.218, -95.25)
  point P0 (14.859, -114.3)
  dimension "d200" = 3.175
extrude "Extrusion17" cut sketch "Sketch26" against normal blind 50.8
sketch "Sketch27" plane through (14.859, 82.55, 14.859) normal (0, 1, 0) x (1, 0, 0)
  line L0 (-29.718, 0) -> (-29.718, -38.1) projected
  circle A0 centre (-29.718, -19.05) radius 19.05
  line L1 (-29.718, 0) -> (0, 0) projected
  line L2 (-29.718, -38.1) -> (0.762, -38.1) projected
  point P0 (-14.859, 14.859)
  dimension "d203" = 38.1
  dimension "d204" = 19.05
  dimension "d205" = 38.1
extrude "Extrusion18" cut sketch "Sketch27" against normal blind 101.6
sketch "Sketch30" plane through (-9.779, 40.005, 9.779) normal (0, 0, -1) x (-1, 0, 0)
  line L0 (-19.05, 34.925) -> (-14.7718, 34.925)
  line L1 (-14.7718, 34.925) -> (-14.7718, -14.5025)
  line L2 (-14.7718, -14.5025) -> (-19.05, -14.5025)
  line L3 (-19.05, -14.5025) -> (-19.05, 34.925)
  point P0 (-9.779, -40.005)
extrude "Extrusion19" add sketch "Sketch30" against normal blind 5.08
properties part number "final_bracket"
